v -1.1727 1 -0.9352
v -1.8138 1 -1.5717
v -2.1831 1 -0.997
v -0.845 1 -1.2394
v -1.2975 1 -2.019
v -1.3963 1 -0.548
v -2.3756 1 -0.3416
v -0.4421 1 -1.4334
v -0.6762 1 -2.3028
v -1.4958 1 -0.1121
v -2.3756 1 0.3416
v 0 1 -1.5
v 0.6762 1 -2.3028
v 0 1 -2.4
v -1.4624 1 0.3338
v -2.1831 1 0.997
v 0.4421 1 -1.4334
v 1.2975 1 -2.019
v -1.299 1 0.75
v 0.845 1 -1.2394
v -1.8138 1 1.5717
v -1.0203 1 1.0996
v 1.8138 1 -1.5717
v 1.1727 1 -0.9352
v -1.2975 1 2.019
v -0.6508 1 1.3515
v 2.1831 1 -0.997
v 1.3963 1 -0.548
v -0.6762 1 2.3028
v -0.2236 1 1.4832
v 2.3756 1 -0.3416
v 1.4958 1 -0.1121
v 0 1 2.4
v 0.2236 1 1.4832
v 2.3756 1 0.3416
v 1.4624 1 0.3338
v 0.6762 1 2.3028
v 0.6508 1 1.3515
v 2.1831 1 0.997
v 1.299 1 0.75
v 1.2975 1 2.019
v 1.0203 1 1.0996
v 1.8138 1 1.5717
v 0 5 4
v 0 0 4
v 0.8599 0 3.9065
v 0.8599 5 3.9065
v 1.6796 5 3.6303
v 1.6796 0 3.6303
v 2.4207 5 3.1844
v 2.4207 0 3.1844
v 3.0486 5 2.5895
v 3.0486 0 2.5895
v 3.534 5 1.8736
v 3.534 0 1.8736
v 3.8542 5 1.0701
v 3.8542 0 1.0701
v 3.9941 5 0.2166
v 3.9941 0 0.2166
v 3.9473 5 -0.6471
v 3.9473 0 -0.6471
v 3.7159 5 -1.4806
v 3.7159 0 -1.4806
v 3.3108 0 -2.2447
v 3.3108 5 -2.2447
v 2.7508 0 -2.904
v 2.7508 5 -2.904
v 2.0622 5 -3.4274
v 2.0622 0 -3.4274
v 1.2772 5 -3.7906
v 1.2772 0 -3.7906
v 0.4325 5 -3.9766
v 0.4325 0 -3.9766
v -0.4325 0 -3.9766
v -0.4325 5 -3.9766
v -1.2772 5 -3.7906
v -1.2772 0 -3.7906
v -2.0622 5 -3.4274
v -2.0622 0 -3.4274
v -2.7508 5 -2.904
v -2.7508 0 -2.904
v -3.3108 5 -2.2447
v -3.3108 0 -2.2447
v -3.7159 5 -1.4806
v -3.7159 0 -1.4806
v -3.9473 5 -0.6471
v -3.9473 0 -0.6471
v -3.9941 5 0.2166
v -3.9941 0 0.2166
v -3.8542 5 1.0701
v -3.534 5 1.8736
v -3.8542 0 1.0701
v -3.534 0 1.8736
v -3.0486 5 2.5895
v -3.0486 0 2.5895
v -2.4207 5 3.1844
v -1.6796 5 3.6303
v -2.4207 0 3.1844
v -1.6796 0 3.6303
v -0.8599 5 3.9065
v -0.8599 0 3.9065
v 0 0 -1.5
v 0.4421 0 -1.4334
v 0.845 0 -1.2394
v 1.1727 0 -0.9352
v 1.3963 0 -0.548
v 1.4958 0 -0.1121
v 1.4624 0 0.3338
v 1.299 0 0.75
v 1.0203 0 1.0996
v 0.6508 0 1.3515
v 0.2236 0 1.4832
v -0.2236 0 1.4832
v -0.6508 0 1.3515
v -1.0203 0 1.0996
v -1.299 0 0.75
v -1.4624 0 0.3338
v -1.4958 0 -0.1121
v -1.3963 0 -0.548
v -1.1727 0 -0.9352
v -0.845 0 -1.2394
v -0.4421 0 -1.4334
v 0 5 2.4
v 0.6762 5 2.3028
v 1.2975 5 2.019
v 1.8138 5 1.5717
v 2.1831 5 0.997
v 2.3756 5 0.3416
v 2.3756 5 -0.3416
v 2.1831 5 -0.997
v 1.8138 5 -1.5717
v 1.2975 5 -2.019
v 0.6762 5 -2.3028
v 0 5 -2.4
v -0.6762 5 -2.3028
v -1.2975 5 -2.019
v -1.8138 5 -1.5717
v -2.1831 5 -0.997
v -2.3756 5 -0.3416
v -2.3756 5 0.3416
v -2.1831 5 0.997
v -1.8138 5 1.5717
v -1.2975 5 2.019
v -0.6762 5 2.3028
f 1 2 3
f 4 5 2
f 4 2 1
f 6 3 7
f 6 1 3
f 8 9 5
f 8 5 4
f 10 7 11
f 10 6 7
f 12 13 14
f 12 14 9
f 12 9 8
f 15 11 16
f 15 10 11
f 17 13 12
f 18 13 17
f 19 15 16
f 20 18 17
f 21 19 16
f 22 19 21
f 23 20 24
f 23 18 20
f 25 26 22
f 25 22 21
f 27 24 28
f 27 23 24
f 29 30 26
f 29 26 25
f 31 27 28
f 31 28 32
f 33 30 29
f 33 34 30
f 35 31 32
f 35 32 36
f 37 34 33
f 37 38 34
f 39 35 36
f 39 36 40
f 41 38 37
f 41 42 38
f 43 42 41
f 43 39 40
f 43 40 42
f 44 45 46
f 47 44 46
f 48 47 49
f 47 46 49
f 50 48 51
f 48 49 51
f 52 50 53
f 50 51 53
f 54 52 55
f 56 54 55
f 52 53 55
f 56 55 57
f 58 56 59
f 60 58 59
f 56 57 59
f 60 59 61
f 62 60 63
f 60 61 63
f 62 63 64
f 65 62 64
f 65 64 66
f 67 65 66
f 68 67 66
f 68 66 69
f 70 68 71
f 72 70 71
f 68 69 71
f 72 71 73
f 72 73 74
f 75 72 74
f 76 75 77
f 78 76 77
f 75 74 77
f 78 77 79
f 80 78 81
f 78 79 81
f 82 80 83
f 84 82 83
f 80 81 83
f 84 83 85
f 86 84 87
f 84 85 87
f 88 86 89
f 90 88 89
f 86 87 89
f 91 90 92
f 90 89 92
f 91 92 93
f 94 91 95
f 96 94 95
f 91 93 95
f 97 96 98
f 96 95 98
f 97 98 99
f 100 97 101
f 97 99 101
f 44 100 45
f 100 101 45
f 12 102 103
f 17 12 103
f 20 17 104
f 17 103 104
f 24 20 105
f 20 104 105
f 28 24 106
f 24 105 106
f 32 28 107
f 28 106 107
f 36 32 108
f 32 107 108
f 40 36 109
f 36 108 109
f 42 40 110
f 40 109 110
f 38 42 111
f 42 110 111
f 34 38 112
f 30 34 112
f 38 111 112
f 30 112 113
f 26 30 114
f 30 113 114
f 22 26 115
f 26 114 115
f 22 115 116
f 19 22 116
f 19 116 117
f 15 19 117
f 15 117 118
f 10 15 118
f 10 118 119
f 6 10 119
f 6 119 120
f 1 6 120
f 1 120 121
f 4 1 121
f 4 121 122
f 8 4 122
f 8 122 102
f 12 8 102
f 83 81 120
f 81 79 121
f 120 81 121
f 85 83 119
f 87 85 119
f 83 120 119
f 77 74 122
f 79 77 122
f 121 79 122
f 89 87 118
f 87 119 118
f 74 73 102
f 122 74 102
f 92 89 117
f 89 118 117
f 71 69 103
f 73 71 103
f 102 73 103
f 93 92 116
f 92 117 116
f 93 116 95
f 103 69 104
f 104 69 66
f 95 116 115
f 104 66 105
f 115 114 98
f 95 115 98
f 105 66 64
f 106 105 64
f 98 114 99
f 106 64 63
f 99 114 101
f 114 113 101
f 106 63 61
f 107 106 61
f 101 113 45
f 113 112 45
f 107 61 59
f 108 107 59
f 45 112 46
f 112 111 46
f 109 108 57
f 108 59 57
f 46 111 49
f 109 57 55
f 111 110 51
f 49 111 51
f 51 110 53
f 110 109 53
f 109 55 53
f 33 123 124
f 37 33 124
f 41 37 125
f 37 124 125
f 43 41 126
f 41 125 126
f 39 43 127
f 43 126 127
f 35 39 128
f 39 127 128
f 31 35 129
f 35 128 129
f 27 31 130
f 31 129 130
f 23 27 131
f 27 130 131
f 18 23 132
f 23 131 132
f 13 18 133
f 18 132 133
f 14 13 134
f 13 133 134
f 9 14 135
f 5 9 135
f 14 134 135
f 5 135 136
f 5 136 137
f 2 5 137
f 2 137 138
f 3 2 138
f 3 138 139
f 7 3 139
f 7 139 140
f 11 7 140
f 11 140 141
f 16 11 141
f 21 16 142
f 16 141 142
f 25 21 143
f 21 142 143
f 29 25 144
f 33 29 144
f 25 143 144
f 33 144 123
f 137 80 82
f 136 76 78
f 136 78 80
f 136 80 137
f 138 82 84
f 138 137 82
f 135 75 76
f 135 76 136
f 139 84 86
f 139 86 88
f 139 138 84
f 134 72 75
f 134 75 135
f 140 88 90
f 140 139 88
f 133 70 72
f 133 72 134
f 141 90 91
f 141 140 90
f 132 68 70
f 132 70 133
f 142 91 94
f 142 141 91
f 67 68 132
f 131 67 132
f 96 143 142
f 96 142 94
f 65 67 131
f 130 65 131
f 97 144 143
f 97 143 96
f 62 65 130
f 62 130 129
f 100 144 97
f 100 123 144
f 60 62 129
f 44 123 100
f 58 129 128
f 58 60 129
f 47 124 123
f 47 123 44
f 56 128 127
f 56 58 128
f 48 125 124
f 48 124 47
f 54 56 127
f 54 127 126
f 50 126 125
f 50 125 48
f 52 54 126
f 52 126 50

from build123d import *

# Parameters (mm, degrees)
ESQUISSE1_R             = 4
BOSS_EXTRU_1_DEPTH      = 5
ESQUISSE3_R             = 1.5
ENL_V_MAT_EXTRU_2_DEPTH = 8.549834435
ESQUISSE2_R             = 2.4
ENL_V_MAT_EXTRU_3_DEPTH = 4


with BuildPart() as part:
    # Esquisse1 → Boss.-Extru.1 (new body)
    with BuildSketch(Plane(origin=(0, 0, 0), x_dir=(1, 0, 0), z_dir=(0, 1, 0))):
        with Locations(Location((0, 0, 0), (0, 0, 270))):
            Circle(ESQUISSE1_R)
    extrude(amount=BOSS_EXTRU_1_DEPTH)

    # Esquisse3 → Enlèv. mat.-Extru.2 (cut, through all)
    with BuildSketch(Plane.XZ):
        with Locations(Location((0, 0, 0), (0, 0, 270))):
            Circle(ESQUISSE3_R)
    extrude(amount=-ENL_V_MAT_EXTRU_2_DEPTH, mode=Mode.SUBTRACT)

    # Esquisse2 → Enlèv. mat.-Extru.3 (cut)
    with BuildSketch(Plane(origin=(0, 5, 0), x_dir=(1, 0, 0), z_dir=(0, 1, 0))):
        with Locations(Location((0, 0, 0), (0, 0, 270))):
            Circle(ESQUISSE2_R)
    extrude(amount=-ENL_V_MAT_EXTRU_3_DEPTH, mode=Mode.SUBTRACT)


solid = part.part
